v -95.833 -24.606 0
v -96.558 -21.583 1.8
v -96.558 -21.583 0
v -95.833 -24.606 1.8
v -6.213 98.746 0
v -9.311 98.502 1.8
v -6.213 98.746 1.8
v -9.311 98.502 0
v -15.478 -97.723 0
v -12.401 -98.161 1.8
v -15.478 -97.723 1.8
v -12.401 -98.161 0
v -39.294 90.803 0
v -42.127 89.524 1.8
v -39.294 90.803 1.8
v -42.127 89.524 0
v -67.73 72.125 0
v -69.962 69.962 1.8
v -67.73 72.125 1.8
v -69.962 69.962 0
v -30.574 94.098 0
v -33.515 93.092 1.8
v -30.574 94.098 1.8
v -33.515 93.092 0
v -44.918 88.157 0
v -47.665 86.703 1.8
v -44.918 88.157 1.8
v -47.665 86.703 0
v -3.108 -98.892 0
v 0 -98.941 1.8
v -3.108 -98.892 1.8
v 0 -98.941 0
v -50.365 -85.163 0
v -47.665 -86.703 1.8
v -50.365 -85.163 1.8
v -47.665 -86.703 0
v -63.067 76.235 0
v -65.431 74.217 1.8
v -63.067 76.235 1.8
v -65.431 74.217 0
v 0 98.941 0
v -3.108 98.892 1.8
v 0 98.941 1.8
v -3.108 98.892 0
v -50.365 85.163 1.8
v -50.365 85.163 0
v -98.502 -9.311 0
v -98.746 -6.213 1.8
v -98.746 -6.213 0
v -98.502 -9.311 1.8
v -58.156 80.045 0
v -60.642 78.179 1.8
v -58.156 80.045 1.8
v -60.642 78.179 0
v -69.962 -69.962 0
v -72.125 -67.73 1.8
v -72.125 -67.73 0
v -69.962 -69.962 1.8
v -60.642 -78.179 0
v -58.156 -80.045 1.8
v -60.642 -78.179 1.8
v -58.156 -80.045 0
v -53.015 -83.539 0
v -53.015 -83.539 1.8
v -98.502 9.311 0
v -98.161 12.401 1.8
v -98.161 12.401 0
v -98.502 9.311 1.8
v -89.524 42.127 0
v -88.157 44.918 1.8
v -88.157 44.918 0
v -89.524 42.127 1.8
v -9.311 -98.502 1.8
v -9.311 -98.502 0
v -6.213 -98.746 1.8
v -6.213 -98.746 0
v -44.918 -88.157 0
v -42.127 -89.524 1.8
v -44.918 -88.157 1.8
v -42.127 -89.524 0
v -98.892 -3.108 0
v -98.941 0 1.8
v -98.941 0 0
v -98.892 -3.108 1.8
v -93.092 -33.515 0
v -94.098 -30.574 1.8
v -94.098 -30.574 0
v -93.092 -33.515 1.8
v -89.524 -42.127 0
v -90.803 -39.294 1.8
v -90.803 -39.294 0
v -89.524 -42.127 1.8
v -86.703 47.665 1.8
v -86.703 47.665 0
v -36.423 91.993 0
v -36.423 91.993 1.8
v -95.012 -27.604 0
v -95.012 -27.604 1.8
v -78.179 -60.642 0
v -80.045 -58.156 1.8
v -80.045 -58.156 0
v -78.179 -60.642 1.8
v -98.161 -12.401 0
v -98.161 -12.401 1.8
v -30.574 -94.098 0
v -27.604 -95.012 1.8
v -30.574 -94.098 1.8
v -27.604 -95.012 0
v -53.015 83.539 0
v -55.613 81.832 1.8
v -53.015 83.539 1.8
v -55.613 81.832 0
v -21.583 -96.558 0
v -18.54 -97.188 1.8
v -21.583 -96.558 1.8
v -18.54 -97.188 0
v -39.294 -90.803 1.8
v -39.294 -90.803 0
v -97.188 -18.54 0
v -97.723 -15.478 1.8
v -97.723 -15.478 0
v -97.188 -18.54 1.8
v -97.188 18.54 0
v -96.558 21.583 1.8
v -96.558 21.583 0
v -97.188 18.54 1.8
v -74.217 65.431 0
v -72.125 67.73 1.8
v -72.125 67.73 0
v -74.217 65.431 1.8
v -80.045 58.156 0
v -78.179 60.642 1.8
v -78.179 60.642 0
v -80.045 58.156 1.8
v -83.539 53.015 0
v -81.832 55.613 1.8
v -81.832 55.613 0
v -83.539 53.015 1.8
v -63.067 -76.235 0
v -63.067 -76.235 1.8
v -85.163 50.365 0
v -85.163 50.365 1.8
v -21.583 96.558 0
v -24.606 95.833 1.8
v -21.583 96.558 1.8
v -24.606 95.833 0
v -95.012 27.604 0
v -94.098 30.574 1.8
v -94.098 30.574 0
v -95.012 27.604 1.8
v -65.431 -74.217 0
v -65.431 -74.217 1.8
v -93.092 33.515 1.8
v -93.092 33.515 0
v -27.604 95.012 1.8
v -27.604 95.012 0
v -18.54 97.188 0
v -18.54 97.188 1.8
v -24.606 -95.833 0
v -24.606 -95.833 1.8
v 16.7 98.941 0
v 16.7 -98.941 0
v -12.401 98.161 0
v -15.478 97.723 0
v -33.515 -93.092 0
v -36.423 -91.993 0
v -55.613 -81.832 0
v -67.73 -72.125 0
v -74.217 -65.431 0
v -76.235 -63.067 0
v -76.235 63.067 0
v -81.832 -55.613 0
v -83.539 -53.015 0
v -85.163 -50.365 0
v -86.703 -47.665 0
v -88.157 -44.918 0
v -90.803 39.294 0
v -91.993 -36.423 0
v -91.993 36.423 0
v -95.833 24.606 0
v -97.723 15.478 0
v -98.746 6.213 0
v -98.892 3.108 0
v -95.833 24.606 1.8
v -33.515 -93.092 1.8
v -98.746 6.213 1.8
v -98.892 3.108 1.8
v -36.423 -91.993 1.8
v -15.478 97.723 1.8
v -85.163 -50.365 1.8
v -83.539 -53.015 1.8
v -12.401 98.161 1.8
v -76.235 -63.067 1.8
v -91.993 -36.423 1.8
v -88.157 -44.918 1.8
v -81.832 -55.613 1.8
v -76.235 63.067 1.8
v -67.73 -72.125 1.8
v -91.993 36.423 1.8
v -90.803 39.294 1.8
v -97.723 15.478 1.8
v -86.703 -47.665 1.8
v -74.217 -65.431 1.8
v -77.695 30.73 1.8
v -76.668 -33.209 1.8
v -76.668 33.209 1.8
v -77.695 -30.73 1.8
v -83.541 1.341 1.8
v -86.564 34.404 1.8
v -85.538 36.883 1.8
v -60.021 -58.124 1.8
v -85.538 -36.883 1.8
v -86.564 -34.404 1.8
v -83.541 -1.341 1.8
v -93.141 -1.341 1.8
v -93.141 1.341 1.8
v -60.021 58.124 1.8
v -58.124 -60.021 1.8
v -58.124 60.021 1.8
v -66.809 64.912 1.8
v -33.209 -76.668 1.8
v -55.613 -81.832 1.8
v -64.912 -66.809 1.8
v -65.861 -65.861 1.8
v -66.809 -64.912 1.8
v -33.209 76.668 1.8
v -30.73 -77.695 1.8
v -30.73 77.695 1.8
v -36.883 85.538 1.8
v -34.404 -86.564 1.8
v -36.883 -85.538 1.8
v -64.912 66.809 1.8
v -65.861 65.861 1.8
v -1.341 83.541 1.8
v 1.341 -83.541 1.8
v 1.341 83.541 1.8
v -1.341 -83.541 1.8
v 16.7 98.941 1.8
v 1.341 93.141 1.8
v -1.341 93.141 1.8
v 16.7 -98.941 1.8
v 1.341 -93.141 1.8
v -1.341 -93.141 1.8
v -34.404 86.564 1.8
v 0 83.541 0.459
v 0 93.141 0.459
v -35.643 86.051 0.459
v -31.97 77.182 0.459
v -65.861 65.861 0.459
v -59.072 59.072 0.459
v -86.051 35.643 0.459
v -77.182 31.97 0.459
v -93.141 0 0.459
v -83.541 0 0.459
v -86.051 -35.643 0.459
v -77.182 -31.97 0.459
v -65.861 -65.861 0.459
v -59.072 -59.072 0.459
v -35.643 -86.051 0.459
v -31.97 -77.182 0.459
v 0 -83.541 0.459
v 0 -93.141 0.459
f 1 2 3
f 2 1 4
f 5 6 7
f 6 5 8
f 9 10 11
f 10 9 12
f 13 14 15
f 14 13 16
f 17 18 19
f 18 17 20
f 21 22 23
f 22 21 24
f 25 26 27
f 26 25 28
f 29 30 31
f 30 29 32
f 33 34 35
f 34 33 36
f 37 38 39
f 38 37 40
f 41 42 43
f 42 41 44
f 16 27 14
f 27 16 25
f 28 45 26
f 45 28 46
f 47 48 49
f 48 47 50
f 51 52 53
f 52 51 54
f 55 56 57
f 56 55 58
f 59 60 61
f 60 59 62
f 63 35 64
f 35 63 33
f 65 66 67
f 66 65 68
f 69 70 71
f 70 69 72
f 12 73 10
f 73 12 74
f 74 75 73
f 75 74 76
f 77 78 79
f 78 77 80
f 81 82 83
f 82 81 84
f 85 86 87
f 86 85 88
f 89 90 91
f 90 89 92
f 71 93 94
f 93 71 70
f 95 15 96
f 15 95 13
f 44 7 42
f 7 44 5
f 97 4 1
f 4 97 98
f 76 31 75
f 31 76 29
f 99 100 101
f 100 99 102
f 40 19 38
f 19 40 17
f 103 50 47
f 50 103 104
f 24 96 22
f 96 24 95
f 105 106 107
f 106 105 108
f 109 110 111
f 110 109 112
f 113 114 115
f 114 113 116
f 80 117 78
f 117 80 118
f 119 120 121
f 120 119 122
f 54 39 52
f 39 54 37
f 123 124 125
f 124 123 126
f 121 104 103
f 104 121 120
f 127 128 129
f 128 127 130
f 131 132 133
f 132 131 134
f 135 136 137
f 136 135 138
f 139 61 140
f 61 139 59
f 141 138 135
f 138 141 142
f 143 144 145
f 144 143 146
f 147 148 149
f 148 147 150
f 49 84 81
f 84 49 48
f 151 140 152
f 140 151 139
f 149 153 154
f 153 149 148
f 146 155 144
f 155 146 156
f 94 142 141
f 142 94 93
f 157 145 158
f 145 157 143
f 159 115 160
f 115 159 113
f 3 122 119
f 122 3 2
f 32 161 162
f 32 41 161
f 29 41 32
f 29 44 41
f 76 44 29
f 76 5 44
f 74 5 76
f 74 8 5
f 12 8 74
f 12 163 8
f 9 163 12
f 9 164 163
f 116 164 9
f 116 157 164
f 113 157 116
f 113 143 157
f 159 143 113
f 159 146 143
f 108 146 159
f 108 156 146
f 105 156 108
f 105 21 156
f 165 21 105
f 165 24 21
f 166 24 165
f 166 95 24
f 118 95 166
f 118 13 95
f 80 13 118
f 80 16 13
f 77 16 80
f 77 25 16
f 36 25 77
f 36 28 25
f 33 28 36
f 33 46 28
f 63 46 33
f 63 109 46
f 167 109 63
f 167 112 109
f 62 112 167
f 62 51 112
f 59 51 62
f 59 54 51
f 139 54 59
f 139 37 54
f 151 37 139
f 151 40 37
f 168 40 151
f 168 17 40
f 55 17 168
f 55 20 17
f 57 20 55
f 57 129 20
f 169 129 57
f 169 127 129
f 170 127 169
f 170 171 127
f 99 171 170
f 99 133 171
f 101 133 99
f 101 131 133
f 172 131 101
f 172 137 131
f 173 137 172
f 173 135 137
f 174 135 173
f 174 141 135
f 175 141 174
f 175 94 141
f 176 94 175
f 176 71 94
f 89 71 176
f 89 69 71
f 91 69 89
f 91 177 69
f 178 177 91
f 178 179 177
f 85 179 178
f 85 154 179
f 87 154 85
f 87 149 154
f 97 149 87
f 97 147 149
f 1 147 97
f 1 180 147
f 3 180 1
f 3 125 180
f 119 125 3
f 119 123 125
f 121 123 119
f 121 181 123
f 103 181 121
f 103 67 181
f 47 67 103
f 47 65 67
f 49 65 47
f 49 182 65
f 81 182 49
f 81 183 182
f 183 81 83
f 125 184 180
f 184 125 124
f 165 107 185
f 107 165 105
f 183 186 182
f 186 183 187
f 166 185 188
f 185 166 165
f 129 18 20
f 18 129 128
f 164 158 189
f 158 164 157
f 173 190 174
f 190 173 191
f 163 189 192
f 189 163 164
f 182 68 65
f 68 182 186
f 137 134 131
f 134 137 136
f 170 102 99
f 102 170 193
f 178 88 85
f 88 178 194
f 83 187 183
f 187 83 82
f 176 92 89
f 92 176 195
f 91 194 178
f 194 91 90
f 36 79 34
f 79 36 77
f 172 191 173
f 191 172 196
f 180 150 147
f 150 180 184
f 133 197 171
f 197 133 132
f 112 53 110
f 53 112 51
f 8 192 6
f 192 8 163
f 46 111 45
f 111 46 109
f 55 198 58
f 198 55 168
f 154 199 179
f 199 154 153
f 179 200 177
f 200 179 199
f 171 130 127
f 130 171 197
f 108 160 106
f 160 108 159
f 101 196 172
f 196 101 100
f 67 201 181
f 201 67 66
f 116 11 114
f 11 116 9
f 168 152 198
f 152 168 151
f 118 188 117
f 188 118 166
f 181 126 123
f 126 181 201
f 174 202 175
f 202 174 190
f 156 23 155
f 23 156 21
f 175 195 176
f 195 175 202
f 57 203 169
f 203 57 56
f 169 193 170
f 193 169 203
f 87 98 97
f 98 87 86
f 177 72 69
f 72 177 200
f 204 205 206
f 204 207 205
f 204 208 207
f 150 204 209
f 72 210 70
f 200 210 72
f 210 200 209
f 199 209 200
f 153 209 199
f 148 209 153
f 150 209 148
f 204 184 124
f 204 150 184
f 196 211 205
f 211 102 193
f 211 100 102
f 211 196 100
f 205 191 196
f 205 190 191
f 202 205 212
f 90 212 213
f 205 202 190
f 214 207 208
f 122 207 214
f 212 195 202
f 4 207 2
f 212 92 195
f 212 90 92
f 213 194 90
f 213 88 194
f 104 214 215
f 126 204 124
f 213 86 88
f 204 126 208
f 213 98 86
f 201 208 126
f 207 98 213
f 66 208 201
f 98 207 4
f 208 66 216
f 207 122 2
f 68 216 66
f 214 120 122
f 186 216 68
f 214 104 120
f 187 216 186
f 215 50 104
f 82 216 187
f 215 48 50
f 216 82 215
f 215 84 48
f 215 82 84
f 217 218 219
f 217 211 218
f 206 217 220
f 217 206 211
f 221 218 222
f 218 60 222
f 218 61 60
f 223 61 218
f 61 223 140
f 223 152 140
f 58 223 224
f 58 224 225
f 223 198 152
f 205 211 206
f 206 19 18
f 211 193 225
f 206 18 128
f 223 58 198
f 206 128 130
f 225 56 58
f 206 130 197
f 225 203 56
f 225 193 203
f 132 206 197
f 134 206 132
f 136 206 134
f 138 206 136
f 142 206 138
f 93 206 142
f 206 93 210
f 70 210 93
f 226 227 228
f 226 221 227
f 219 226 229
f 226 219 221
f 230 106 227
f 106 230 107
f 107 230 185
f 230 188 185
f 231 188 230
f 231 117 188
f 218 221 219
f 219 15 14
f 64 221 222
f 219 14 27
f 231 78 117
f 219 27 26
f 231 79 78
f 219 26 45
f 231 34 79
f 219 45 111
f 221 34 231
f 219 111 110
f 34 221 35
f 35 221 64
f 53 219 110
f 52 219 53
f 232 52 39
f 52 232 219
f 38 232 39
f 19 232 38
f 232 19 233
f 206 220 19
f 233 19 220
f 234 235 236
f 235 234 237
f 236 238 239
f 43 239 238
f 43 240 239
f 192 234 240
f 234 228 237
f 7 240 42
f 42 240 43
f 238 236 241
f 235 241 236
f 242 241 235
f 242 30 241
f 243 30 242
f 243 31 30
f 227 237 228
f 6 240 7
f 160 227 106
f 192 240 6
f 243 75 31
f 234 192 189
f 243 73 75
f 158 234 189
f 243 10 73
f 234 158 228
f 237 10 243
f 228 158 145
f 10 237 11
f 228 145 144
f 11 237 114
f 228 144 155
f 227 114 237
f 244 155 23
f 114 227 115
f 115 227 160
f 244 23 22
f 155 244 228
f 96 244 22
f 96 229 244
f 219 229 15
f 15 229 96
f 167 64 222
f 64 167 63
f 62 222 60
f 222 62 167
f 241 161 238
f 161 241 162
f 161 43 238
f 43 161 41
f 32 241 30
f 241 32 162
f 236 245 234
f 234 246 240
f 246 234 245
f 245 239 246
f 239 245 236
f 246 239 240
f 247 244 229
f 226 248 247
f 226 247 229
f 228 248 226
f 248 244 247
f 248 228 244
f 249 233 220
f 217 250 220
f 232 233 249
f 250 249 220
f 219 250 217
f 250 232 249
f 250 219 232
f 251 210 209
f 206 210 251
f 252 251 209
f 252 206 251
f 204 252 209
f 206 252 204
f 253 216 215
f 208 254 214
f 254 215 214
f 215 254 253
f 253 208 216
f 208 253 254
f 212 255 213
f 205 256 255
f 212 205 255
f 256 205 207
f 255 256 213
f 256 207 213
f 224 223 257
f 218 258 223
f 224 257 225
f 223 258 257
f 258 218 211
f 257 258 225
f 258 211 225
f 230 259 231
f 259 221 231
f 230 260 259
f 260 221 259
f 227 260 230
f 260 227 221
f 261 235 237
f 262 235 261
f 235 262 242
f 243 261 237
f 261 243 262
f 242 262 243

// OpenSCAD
$fn = 200;

pitch = 31;
led_per_stack = 1;
height = pitch * led_per_stack;
led_per_layer = 16;
inner_radius = (pitch * led_per_layer) / (2 * 3.14159);
wall_depth = 1.2;
led_radius = (11.5+.2)/2;
led_cell_depth=20;
notch_diag=(wall_depth*2);
notch_height=(notch_diag)/1.4142;

echo("Inner Diameter", (inner_radius * 2));
echo("Outer Diameter", ((inner_radius + 10) * 2));
echo("Outer Circumference Inches", ((inner_radius + 10) * 2 * 3.14159) / 25.4);
echo("LED Count", led_per_stack * led_per_layer);
echo("Amps Needed", led_per_stack * led_per_layer * .06);

//ring_even_half_left();
//ring_even_half_right();
//ring_odd_half_left();
//ring_odd_half_right();
top_half_left();
//top_half_right();
//mount_plate();
//alt_bottom_half_left();
//alt_bottom_half_right();
//bottom_half_right();

module bottom_half_left() {
    difference() {
        union() {
            cylinder(r=inner_radius+led_cell_depth,h=pitch*1.5);
            translate([0,-(inner_radius+led_cell_depth),0]) cube([(pitch/2)+wall_depth, (inner_radius+led_cell_depth) * 2, pitch*1.5]);
        }
        translate([0,0,pitch/2-.01]) cylinder(r1=inner_radius-wall_depth, r2=inner_radius-wall_depth*4+led_cell_depth ,h=pitch+.02);
        translate([0,0,-.01]) cylinder(r=inner_radius-wall_depth,h=pitch+.02);
        translate([(pitch/2)+wall_depth,-(inner_radius+led_cell_depth),-1]) cube([500, (inner_radius+led_cell_depth) * 2, pitch*1.5+2]);
        translate([0,-(inner_radius-wall_depth),-1]) cube([500, (inner_radius-wall_depth) * 2, pitch+2]);
        translate([0+.01,inner_radius-wall_depth-.01,pitch/2-.01]) rotated_prism((pitch/2)+wall_depth,led_cell_depth-wall_depth*3,pitch+.02,180,0,0);
        translate([0+.01,-inner_radius+wall_depth-led_cell_depth+wall_depth*3+.01,pitch/2-.01]) rotated_prism((pitch/2)+wall_depth,led_cell_depth-wall_depth*3,pitch+.02,180,0,180);
    }
}

module bottom_half_right() {
    difference() {
        translate([pitch+wall_depth*2,0,0]) rotate([0,0,180]) bottom_half_left();
        translate([inner_radius-6,0,-pitch]) rotate([0,45,0]) cylinder(d=10,h=100);
    }
}

module alt_bottom_half_left() {
    difference() {
        union() {
            cylinder(r=inner_radius+led_cell_depth,h=pitch*2.5);
            translate([0,-(inner_radius+led_cell_depth),0]) cube([(pitch/2)+wall_depth, (inner_radius+led_cell_depth) * 2, pitch*2.5]);
        }
        translate([0,0,wall_depth-.01]) cylinder(r=inner_radius-wall_depth*2+led_cell_depth ,h=pitch*2.5+.02);
        translate([0,0,-.01]) cylinder(r=inner_radius-wall_depth*8+led_cell_depth,h=pitch+.02);
        translate([(pitch/2)+wall_depth,-(inner_radius+led_cell_depth),-1]) cube([500, (inner_radius+led_cell_depth) * 2, pitch*2.5+2]);
        translate([0,-(inner_radius+led_cell_depth-wall_depth*2),wall_depth]) cube([100, (inner_radius+led_cell_depth-wall_depth*2) * 2, pitch*2.5+2]);
        translate([0,-(inner_radius+led_cell_depth-wall_depth*8),-1]) cube([100, (inner_radius+led_cell_depth-wall_depth*8) * 2, pitch*2.5+2]);
    }
    // tabs
    translate([pitch/2-wall_depth*.5,(inner_radius+led_cell_depth-wall_depth*8),wall_depth]) rotated_prism(wall_depth*1.5,wall_depth*6,height,0,0,0);
    translate([pitch/2-wall_depth*.5,-(inner_radius+led_cell_depth-wall_depth*2),wall_depth]) rotated_prism(wall_depth*1.5,wall_depth*6,height,0,0,180);
}

module alt_bottom_half_right() {
    difference() {
        translate([pitch+wall_depth*2,0,0]) rotate([0,0,180]) alt_bottom_half_left();
        translate([inner_radius-6,0,-pitch]) rotate([0,45,0]) cylinder(d=10,h=100);
    }
}

module top_half_left() {
    difference() {
        union() {
            cylinder(r=inner_radius+led_cell_depth,h=wall_depth*1.5);
            translate([0,-(inner_radius+led_cell_depth),0]) cube([pitch/2+wall_depth, (inner_radius+led_cell_depth) * 2, wall_depth*1.5]);
        }
        translate([pitch/2+wall_depth,-(inner_radius+led_cell_depth),-1]) cube([500, (inner_radius+led_cell_depth) * 2, wall_depth*1.5+2]);
        for(i = [0:1:led_per_layer - 1]) {
            translate([0,0,wall_depth*1.5]) rotate([45,0,i * (360 / led_per_layer)]) translate([inner_radius+((led_cell_depth-wall_depth)/4)-.1,-(notch_height)/2-.1,-(notch_height)/2-.1]) cube([(led_cell_depth-wall_depth)/2+.2,notch_height+.2,notch_height+.2]);
        }
    }
}

module top_half_right() {
    translate([pitch+wall_depth*2,0,0]) rotate([0,0,180]) top_half_left();
}

module mount_plate() {
    difference() {
        translate([-60,-55,0]) cube([95,75,wall_depth*2]);
        translate([-2,-8,-.1]) cube([32,12,50]);
        translate([-2,-24,-.1]) cube([32,12,50]);
        translate([-2,-40,-.1]) cube([32,12,50]);
        translate([-55,-50,-.1]) cube([12,27,50]);
        translate([-38,-50,-.1]) cube([12,27,50]);
        translate([-21,-50,-.1]) cube([12,27,50]);
    }
    translate([-10,5,wall_depth]) rotate([0,0,180]) fadecandy_mount();
    translate([30,-50,wall_depth]) rotate([0,0,90]) pi_zero_mount();
}

module fadecandy_mount() {
    difference() {
        cube([41,23,10]);
        translate([1,1,6]) cube([39,21,10]);
        translate([-1,3,-1]) cube([43,17,12]);
    }
    translate([35,19.5,7.5]) rotated_prism(5, 3, 2, 90, 0 ,0);
    translate([35,0.5,7.5]) rotated_prism(5, 3, 2, 90, 0, 180);
}

module pi_zero_mount() {
    translate([0+3.5,0+3.5,0]) difference() {
        cylinder(d=5,h=6);
        translate([0,0,-.01]) cylinder(d=2.45,h=6+.02);
    }
    translate([58+3.5,0+3.5,0]) difference() {
        cylinder(d=5,h=6);
        translate([0,0,-.01]) cylinder(d=2.45,h=6+.02);
    }
    translate([0+3.5,23+3.5,0]) difference() {
        cylinder(d=5,h=6);
        translate([0,0,-.01]) cylinder(d=2.45,h=6+.02);
    }
    translate([58+3.5,23+3.5,0]) difference() {
        cylinder(d=5,h=6);
        translate([0,0,-.01]) cylinder(d=2.45,h=6+.02);
    }
}

module ring_even_half_left() {
    difference() {
        union() {
            // outer ring
            difference() {
                cylinder(r=inner_radius+led_cell_depth,h=height);
                translate([0,0,-1]) cylinder(r=inner_radius+led_cell_depth-wall_depth,h=height+2);
            }

            // inner ring and ribs
            difference() {
                union() {
                    cylinder(r=inner_radius,h=height);
                    for(i = [0:1:led_per_layer - 1]) {
                        rotate([0,0,i * (360 / led_per_layer)]) translate([inner_radius-wall_depth,-(wall_depth),0]) cube([led_cell_depth,wall_depth*2,height]);
                        translate([0,0,height]) rotate([45,0,i * (360 / led_per_layer)]) translate([inner_radius+((led_cell_depth-wall_depth)/4),-(notch_height)/2,-(notch_height)/2]) cube([(led_cell_depth-wall_depth)/2,notch_height,notch_height]);
                    }
                    for(i = [0:1:led_per_stack - 1]) {
                        translate([0,0,pitch*i]) cylinder(r=inner_radius+led_cell_depth,h=wall_depth*2);
                    }
                }
                translate([0,0,-1]) cylinder(r=inner_radius-wall_depth,h=height+10);
                for(i = [0:1:led_per_layer - 1]) {
                    rotate([45,0,i * (360 / led_per_layer)]) translate([inner_radius+((led_cell_depth-wall_depth)/4)-.1,-(notch_height)/2-.1,-(notch_height)/2-.1]) cube([(led_cell_depth-wall_depth)/2+.2,notch_height+.2,notch_height+.2]);
                    rotate([90,0,(360 / led_per_layer) * (i + 0.5)]) translate([0,pitch/2 + wall_depth,wall_depth]) cylinder(r=led_radius,h=inner_radius);
                }
            }
        } 
        
        translate([0,-100,-100]) cube([200,200,200]);
    }

    // extension on one side
    translate([0,(inner_radius-wall_depth),0]) cube([pitch+(wall_depth*2),led_cell_depth+wall_depth,wall_depth*2]);
    translate([0,inner_radius+led_cell_depth-wall_depth,0]) cube([pitch+(wall_depth*2),wall_depth,height]);
    difference() {
        translate([0,inner_radius-wall_depth,0]) cube([pitch+(wall_depth*2),wall_depth,height]);
        rotate([-90,0,0]) translate([pitch/2+wall_depth,-pitch/2 - wall_depth,wall_depth]) cylinder(r=led_radius,h=inner_radius);
    }
    translate([pitch+wall_depth,inner_radius-wall_depth,0]) cube([wall_depth,led_cell_depth+wall_depth,height]);
    translate([0,inner_radius-wall_depth,0]) cube([wall_depth,led_cell_depth+wall_depth,height]);

    // tabs
    rotate([0,0,180]) translate([-pitch-wall_depth*2,0,0]) difference() {  
        translate([0,-inner_radius+height/3+wall_depth-.001,height]) prism(wall_depth*1.5,-height/3,-3*height/4);
        rotate([0,90,0]) translate([-7*height/8,-inner_radius+height/8+wall_depth,-1]) cylinder(d=3,h=wall_depth*2+2);
    }
    rotate([0,0,0]) translate([0,0,0]) difference() {  
        translate([-wall_depth*1.5,-inner_radius+height/3+wall_depth,height]) prism(wall_depth*1.5,-height/3,-3*height/4);
        rotate([0,90,0]) translate([-7*height/8,-inner_radius+height/8+wall_depth,-4]) cylinder(d=3,h=wall_depth*2+2);
    }
}

module ring_even_half_right() {
    translate([pitch+wall_depth*2,0,0]) rotate([0,0,180]) ring_even_half_left();
}

module ring_odd_half_left() {
    difference() {
        union() {
            // outer ring
            difference() {
                cylinder(r=inner_radius+led_cell_depth,h=height);
                translate([0,0,-1]) cylinder(r=inner_radius+led_cell_depth-wall_depth,h=height+2);
            }

            // inner ring and ribs
            difference() {
                union() {
                    cylinder(r=inner_radius,h=height);
                    for(i = [0:1:led_per_layer - 1]) {
                        rotate([0,0,i * (360 / led_per_layer)]) translate([inner_radius-wall_depth,-(wall_depth),0]) cube([led_cell_depth,wall_depth*2,height]);
                        translate([0,0,height]) rotate([45,0,i * (360 / led_per_layer)]) translate([inner_radius+((led_cell_depth-wall_depth)/4),-(notch_height)/2,-(notch_height)/2]) cube([(led_cell_depth-wall_depth)/2,notch_height,notch_height]);
                    }
                    for(i = [0:1:led_per_stack - 1]) {
                        translate([0,0,pitch*i]) cylinder(r=inner_radius+led_cell_depth,h=wall_depth*2);
                    }
                }
                translate([0,0,-1]) cylinder(r=inner_radius-wall_depth,h=height+10);
                for(i = [0:1:led_per_layer - 1]) {
                    rotate([45,0,i * (360 / led_per_layer)]) translate([inner_radius+((led_cell_depth-wall_depth)/4)-.1,-(notch_height)/2-.1,-(notch_height)/2-.1]) cube([(led_cell_depth-wall_depth)/2+.2,notch_height+.2,notch_height+.2]);
                    rotate([90,0,(360 / led_per_layer) * (i + 0.5)]) translate([0,pitch/2 + wall_depth,wall_depth]) cylinder(r=led_radius,h=inner_radius);
                }
            }
        } 
        
        translate([0,-100,-100]) cube([200,200,200]);
    }

    // extension on one side
    translate([0,-(inner_radius-wall_depth)-led_cell_depth-wall_depth,0]) cube([pitch+(wall_depth*2),led_cell_depth+wall_depth,wall_depth*2]);
    translate([0,-inner_radius-led_cell_depth,0]) cube([pitch+(wall_depth*2),wall_depth,height]);
    difference() {
        translate([0,-inner_radius,0]) cube([pitch+(wall_depth*2),wall_depth,height]);
        rotate([90,0,0]) translate([pitch/2+wall_depth,pitch/2 + wall_depth,wall_depth]) cylinder(r=led_radius,h=inner_radius);
    }
    translate([pitch+wall_depth,-inner_radius-led_cell_depth,0]) cube([wall_depth,led_cell_depth+wall_depth,height]);
    translate([0,-inner_radius-led_cell_depth,0]) cube([wall_depth,led_cell_depth+wall_depth,height]);

    // tabs
    rotate([0,0,0]) translate([pitch+wall_depth/2,0,0]) difference() {  
        translate([0,-inner_radius+height/3+wall_depth,height]) prism(wall_depth*1.5,-height/3,-3*height/4);
        rotate([0,90,0]) translate([-7*height/8,-inner_radius+height/8+wall_depth,-1]) cylinder(d=3,h=wall_depth*2+2);
    }
    rotate([0,0,180]) translate([0,0,0]) difference() {  
        translate([0,-inner_radius+height/3+wall_depth,height]) prism(wall_depth*1.5,-height/3,-3*height/4);
        rotate([0,90,0]) translate([-7*height/8,-inner_radius+height/8+wall_depth,-1]) cylinder(d=3,h=wall_depth*2+2);
    }
}

module ring_odd_half_right() {
    translate([pitch+wall_depth*2,0,0]) rotate([0,0,180]) ring_odd_half_left();
}

module rotated_prism(l, w, h, a, b, c) {
    translate([l/2,w/2,h/2]) rotate([a,b,c]) translate([-l/2,-w/2,-h/2]) prism(l,w,h);
}

module prism(l, w, h) {
   polyhedron(
           points=[[0,0,0], [l,0,0], [l,w,0], [0,w,0], [0,w,h], [l,w,h]],
           faces=[[0,1,2,3],[5,4,3,2],[0,4,5,1],[0,3,4],[5,2,1]]
           );
   
}
